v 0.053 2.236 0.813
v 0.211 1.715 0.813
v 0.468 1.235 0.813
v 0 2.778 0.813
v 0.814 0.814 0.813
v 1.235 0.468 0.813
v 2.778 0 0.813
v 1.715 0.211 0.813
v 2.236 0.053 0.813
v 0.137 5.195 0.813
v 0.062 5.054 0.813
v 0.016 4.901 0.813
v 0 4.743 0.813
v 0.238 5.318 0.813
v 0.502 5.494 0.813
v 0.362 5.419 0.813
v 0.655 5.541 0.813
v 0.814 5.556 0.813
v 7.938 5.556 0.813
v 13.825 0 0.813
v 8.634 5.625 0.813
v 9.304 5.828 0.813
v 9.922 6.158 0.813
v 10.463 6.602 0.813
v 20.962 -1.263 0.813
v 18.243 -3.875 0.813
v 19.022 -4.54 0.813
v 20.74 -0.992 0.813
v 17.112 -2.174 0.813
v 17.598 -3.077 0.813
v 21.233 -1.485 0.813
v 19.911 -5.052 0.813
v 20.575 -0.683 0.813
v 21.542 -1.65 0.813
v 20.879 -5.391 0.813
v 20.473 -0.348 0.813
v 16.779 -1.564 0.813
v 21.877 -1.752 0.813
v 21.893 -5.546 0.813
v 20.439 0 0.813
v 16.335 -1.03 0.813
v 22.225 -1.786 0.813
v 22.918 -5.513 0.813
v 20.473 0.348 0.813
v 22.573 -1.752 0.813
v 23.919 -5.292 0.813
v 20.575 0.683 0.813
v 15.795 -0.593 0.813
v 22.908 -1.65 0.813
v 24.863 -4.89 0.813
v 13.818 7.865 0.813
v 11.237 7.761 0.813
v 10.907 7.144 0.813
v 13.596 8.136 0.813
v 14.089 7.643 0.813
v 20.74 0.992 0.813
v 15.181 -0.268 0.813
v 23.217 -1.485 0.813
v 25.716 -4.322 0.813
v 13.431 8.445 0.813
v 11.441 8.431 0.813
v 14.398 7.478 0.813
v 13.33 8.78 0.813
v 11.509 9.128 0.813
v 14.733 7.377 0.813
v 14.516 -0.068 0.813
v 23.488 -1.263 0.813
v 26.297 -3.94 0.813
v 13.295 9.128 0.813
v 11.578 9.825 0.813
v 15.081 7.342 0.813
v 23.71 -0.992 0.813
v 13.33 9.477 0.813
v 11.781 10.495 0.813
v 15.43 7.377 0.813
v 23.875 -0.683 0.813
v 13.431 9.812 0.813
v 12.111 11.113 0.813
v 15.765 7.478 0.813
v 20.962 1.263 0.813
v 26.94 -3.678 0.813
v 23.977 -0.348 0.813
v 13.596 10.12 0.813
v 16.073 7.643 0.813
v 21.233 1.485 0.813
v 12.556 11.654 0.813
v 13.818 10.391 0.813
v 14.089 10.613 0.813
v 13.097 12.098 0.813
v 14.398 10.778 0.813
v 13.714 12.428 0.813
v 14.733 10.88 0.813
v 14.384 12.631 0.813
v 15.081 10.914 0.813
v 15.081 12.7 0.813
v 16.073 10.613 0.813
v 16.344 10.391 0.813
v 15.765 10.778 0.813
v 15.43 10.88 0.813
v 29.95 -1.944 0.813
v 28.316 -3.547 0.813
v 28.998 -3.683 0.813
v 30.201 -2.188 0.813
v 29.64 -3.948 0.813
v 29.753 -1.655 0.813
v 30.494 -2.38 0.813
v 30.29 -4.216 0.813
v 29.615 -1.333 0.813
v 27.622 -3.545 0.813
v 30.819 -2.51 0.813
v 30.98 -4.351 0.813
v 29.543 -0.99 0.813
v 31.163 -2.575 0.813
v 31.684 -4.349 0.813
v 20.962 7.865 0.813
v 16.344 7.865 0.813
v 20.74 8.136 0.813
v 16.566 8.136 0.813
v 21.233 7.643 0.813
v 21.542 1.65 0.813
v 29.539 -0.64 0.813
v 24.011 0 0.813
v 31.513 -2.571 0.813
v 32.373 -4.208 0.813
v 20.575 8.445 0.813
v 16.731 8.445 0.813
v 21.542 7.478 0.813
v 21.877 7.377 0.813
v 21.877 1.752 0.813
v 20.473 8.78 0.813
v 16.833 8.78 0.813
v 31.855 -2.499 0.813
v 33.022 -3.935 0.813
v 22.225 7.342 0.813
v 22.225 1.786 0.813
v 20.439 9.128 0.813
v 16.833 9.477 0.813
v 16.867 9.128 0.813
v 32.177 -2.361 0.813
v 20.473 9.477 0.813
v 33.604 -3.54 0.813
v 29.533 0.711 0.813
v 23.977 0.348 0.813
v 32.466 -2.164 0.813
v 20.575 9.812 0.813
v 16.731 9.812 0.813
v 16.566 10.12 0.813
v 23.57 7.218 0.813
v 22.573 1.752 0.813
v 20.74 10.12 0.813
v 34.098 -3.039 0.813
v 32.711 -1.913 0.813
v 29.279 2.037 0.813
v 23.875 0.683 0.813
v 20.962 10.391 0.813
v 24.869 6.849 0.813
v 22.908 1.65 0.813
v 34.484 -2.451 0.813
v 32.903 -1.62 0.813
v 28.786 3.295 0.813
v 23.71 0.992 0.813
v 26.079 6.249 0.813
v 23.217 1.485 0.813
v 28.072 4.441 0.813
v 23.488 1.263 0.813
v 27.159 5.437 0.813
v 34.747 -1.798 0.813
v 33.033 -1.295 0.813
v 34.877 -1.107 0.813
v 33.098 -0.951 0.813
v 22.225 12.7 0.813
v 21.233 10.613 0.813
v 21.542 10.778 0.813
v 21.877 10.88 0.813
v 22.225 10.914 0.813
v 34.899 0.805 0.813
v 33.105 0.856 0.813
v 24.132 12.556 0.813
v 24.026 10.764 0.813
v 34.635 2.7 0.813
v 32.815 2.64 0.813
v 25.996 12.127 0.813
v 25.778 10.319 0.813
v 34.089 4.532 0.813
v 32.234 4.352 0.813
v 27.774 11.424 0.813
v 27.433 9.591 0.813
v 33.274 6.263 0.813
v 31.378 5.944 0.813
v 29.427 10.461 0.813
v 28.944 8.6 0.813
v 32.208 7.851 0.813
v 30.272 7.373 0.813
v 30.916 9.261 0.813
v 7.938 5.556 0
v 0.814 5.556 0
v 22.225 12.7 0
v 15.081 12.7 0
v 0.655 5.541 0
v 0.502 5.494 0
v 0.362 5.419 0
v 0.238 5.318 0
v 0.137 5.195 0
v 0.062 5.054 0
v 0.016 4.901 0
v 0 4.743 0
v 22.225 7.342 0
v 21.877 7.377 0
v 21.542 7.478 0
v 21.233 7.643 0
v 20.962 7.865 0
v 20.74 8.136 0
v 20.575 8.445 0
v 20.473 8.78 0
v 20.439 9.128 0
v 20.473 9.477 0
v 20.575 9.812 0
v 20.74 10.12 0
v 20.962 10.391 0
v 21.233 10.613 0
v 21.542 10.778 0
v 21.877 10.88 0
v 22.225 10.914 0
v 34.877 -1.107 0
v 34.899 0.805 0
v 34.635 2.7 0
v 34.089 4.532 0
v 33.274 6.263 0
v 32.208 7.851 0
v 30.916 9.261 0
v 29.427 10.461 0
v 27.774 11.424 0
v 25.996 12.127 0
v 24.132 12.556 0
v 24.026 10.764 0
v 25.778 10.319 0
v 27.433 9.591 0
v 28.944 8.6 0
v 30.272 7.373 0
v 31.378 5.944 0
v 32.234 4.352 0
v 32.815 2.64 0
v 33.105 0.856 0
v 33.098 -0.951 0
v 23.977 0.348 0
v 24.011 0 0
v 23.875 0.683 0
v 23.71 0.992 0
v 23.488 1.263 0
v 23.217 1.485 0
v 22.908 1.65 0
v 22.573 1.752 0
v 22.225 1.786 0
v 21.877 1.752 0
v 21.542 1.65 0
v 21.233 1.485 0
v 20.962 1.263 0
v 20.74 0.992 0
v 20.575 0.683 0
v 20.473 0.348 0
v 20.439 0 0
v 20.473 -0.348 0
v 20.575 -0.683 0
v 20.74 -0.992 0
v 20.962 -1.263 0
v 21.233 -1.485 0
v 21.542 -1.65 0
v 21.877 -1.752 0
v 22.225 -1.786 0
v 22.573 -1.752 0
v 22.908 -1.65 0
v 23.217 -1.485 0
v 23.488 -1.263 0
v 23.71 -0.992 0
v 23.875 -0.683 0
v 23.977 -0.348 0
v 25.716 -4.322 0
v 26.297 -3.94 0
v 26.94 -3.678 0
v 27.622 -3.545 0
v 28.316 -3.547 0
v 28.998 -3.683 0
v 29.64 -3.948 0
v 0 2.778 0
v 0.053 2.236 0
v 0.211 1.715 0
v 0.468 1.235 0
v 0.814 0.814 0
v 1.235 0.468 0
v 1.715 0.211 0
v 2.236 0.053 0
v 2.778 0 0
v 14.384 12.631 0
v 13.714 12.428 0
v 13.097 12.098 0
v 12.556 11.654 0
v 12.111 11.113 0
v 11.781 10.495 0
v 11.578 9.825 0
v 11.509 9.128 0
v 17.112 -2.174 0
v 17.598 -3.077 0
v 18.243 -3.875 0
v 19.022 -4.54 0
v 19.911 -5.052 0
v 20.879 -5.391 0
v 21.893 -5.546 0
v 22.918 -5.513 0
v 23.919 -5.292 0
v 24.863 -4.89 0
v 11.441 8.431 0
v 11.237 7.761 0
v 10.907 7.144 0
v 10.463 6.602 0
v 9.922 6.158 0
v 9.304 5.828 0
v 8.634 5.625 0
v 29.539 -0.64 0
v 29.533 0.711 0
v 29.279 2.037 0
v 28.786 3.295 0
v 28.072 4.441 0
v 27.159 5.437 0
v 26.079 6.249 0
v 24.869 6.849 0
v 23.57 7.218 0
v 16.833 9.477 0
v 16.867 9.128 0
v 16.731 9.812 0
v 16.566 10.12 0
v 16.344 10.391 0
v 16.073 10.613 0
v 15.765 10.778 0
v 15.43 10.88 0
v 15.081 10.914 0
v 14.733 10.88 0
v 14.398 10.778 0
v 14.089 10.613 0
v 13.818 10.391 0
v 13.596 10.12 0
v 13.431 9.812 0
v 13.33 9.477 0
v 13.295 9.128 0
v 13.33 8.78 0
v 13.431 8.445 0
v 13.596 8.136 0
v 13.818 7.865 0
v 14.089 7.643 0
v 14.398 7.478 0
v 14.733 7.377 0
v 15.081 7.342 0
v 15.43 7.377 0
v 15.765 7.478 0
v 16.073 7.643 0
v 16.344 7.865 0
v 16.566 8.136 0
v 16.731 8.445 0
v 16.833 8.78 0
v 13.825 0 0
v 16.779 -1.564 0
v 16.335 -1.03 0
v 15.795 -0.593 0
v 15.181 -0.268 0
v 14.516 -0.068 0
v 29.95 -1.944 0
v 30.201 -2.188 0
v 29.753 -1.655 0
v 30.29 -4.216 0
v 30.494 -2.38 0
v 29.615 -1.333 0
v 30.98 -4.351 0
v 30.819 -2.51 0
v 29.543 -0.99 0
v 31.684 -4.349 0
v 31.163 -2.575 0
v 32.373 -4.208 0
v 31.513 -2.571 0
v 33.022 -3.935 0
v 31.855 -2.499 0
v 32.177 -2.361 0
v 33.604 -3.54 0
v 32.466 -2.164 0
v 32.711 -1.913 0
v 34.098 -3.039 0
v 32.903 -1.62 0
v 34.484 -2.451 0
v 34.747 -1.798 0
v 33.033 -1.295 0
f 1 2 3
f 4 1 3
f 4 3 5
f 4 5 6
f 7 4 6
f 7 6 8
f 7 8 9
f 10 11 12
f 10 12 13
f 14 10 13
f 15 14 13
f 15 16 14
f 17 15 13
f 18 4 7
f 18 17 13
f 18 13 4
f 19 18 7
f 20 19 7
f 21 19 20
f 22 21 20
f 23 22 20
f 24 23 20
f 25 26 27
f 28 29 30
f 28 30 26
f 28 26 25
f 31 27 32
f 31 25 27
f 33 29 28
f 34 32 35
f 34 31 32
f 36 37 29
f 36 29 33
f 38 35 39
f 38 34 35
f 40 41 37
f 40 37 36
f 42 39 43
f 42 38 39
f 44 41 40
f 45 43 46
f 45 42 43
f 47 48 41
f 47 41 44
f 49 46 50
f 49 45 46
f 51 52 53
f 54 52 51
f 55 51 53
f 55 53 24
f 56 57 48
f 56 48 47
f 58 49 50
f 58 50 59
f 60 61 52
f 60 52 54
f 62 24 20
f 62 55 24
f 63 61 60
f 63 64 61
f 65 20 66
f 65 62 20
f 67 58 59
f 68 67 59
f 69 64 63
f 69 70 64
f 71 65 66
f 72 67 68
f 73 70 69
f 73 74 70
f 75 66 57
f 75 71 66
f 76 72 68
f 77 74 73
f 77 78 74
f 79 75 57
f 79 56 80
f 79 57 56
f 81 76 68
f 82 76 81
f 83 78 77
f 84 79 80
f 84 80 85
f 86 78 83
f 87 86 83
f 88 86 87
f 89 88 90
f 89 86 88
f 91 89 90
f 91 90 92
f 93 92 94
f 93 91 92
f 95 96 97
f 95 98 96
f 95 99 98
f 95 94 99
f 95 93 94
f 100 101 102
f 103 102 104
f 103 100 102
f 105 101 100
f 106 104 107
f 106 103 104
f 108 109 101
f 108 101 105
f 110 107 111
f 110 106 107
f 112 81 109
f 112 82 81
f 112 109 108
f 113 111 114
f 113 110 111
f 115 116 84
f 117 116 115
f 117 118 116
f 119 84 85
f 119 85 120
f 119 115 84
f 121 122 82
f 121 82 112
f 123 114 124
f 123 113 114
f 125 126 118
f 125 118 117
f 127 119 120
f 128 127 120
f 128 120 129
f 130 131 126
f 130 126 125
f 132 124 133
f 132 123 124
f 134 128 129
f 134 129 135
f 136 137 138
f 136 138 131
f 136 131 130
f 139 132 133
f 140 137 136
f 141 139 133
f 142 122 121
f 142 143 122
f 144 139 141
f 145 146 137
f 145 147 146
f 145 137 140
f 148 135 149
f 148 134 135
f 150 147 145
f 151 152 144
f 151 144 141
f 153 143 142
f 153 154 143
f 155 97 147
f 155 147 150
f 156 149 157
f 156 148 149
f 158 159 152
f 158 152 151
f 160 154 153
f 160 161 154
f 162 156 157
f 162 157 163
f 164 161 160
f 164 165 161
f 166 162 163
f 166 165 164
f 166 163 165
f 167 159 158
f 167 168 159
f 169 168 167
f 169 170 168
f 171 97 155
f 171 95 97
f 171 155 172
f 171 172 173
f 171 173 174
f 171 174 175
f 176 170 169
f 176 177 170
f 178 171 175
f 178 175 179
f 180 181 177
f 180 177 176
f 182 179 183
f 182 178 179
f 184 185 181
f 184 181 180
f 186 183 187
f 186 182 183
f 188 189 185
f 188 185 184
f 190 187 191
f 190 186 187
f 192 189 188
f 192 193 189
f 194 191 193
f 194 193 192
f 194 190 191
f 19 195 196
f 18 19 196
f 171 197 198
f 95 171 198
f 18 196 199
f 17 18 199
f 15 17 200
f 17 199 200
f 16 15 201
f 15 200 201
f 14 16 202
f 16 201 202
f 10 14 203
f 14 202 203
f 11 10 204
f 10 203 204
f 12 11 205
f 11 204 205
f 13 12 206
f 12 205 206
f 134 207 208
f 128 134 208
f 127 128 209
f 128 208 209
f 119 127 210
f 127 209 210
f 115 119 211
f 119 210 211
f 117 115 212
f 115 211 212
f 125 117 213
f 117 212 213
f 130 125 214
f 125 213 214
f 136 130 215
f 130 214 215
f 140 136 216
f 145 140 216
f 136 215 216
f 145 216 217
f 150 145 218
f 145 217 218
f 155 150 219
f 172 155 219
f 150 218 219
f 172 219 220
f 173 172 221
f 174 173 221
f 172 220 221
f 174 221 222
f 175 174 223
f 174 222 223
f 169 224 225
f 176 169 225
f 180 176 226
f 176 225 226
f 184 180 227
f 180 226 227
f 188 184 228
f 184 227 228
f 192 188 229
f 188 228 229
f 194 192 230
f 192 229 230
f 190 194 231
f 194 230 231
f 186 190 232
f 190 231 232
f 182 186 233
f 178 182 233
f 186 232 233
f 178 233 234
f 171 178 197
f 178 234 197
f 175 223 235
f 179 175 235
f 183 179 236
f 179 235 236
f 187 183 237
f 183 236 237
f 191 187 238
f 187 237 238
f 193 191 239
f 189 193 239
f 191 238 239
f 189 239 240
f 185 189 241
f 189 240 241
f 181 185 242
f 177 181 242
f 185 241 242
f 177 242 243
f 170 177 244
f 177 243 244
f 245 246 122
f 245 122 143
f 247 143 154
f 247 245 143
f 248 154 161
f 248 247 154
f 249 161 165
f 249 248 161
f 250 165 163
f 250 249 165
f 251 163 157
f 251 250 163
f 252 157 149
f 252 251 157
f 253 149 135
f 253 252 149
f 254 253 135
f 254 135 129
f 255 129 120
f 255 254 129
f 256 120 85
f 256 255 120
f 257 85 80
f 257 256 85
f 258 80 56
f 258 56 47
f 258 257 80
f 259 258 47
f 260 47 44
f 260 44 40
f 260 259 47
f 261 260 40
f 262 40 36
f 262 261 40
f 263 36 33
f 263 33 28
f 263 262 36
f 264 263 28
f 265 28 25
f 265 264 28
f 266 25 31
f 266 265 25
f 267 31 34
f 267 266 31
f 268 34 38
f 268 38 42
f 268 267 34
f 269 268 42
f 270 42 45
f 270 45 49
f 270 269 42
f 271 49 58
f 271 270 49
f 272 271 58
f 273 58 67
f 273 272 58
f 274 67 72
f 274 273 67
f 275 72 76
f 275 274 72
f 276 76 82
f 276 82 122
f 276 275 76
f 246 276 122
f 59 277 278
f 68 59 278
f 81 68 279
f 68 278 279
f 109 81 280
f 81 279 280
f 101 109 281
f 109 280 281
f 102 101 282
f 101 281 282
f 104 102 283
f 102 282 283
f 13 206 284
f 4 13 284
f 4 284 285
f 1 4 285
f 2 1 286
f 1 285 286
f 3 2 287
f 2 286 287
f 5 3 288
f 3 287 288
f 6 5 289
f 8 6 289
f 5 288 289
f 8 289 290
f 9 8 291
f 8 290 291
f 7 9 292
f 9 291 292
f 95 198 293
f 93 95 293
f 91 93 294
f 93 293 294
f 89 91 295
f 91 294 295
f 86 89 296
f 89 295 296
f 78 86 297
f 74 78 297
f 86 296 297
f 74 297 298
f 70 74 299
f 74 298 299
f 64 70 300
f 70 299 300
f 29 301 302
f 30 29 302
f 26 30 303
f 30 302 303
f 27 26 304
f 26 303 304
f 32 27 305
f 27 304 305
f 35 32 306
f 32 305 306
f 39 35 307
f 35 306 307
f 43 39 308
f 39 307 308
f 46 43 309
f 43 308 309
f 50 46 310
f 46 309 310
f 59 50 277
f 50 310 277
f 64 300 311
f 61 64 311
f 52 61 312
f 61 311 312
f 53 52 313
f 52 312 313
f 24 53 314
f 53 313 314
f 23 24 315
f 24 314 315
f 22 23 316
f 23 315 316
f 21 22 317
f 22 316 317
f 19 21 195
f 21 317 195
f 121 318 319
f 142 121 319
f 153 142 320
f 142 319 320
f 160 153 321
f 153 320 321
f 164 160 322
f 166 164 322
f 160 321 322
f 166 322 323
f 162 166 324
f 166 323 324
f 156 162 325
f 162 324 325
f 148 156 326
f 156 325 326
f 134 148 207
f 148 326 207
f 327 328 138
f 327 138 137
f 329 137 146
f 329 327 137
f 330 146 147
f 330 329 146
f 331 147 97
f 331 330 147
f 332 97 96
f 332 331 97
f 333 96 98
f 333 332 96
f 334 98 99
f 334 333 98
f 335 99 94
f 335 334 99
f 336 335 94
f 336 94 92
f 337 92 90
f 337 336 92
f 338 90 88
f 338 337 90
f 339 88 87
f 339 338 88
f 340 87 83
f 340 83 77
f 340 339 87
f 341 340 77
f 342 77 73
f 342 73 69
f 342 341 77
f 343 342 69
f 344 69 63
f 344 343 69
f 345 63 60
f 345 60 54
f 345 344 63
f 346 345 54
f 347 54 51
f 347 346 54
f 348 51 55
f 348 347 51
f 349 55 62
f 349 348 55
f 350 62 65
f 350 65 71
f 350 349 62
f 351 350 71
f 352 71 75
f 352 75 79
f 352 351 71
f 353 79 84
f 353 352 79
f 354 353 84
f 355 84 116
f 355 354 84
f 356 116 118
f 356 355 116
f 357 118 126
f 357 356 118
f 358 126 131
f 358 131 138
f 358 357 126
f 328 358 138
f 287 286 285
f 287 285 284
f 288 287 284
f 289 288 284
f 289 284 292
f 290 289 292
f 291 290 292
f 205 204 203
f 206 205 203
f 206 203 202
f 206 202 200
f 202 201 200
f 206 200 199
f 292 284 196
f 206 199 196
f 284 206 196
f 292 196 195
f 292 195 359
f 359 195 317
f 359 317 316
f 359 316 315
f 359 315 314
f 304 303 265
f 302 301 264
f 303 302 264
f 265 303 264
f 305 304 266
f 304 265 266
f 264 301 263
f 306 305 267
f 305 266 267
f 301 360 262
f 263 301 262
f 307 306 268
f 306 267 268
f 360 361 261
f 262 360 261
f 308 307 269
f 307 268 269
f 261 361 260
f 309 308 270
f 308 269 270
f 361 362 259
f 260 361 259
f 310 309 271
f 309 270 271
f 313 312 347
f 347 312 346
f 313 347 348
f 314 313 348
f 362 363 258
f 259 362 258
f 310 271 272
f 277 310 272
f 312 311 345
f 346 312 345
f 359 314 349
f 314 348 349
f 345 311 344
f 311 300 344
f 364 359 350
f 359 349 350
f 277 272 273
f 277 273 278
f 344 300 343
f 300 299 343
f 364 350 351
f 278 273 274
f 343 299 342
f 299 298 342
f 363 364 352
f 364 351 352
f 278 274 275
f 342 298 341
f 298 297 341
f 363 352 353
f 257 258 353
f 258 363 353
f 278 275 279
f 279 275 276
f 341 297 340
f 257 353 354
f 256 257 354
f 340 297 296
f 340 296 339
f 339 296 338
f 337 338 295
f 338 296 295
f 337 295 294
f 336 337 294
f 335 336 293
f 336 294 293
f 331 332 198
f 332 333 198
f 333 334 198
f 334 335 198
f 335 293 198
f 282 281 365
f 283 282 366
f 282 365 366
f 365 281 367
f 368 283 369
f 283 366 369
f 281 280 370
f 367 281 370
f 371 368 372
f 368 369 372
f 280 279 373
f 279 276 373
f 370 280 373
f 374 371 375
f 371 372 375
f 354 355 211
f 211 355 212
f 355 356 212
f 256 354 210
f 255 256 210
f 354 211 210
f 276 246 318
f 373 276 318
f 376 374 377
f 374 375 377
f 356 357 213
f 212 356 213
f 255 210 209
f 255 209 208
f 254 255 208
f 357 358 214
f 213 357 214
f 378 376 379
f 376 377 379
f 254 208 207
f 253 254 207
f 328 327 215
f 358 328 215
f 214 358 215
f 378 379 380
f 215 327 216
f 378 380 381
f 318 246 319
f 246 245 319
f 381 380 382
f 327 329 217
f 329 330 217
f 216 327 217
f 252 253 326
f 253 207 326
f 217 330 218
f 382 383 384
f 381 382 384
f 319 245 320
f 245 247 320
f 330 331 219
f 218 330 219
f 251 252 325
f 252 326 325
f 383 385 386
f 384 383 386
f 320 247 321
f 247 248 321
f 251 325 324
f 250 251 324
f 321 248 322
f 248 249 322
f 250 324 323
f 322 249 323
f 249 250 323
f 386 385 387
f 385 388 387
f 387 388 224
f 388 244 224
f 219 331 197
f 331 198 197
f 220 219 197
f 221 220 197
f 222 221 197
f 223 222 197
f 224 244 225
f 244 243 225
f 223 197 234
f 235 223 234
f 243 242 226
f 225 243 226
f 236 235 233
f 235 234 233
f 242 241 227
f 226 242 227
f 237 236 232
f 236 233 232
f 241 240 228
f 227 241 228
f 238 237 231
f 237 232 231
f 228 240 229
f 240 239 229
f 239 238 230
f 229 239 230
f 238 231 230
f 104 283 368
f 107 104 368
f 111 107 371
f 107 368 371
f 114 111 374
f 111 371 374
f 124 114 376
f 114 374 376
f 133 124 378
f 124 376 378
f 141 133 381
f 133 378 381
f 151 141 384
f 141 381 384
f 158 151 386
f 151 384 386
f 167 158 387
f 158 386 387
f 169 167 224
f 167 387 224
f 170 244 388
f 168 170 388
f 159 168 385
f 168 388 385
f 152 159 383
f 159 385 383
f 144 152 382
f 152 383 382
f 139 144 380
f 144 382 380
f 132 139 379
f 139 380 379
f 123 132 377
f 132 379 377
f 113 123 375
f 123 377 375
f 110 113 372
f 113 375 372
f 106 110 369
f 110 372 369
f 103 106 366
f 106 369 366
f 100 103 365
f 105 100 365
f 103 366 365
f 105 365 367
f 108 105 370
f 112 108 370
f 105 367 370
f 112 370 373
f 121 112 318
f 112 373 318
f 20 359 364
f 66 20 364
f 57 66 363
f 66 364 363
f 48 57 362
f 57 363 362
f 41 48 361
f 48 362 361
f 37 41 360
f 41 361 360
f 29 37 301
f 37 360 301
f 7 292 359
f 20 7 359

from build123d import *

# Parameters (mm, degrees)
SKETCH1_R           = 1.7859375
BOSS_EXTRUDE1_DEPTH = 0.8128


with BuildPart() as part:
    # Sketch1 → Boss-Extrude1 (new body)
    with BuildSketch(Plane.XY):
        with BuildLine():
            Line((2.778125, 0), (13.824739587, 0))
            ThreePointArc((13.824739587, 0), (15.795261881, -0.592725305), (17.111798004, -2.174184768))
            ThreePointArc((17.111798004, -2.174184768), (20.879142703, -5.390786788), (25.716280165, -4.322369358))
            ThreePointArc((25.716280165, -4.322369358), (27.621647146, -3.545286331), (29.639532121, -3.948301955))
            ThreePointArc((29.639532121, -3.948301955), (33.02176359, -3.935123977), (34.876672666, -1.106877933))
            ThreePointArc((34.876672666, -1.106877933), (31.588422177, 8.579995637), (22.225, 12.7))
            Line((22.225, 12.7), (15.08125, 12.7))
            ThreePointArc((15.08125, 12.7), (12.555552966, 11.653822034), (11.509375, 9.128125))
            ThreePointArc((11.509375, 9.128125), (10.463197034, 6.602427966), (7.9375, 5.55625))
            Line((7.9375, 5.55625), (0.813693974, 5.55625))
            ThreePointArc((0.813693974, 5.55625), (0.238325447, 5.317924553), (0, 4.742556026))
            Line((0, 4.742556026), (0, 2.778125))
            ThreePointArc((0, 2.778125), (0.813693974, 0.813693974), (2.778125, 0))
        make_face()
        with BuildLine():
            ThreePointArc((33.097531197, -0.951223224), (31.162735019, -2.574709983), (29.53924826, -0.639913805))
            ThreePointArc((29.53924826, -0.639913805), (27.638228446, 4.960309977), (22.225, 7.3421875))
            ThreePointArc((22.225, 7.3421875), (20.4390625, 9.128125), (22.225, 10.9140625))
            ThreePointArc((22.225, 10.9140625), (30.271690934, 7.37343375), (33.097531197, -0.951223224))
        make_face(mode=Mode.SUBTRACT)
        with Locations((22.225, 0)):
            Circle(SKETCH1_R, mode=Mode.SUBTRACT)
        with Locations((15.08125, 9.128125)):
            Circle(SKETCH1_R, mode=Mode.SUBTRACT)
    extrude(amount=BOSS_EXTRUDE1_DEPTH)


solid = part.part
